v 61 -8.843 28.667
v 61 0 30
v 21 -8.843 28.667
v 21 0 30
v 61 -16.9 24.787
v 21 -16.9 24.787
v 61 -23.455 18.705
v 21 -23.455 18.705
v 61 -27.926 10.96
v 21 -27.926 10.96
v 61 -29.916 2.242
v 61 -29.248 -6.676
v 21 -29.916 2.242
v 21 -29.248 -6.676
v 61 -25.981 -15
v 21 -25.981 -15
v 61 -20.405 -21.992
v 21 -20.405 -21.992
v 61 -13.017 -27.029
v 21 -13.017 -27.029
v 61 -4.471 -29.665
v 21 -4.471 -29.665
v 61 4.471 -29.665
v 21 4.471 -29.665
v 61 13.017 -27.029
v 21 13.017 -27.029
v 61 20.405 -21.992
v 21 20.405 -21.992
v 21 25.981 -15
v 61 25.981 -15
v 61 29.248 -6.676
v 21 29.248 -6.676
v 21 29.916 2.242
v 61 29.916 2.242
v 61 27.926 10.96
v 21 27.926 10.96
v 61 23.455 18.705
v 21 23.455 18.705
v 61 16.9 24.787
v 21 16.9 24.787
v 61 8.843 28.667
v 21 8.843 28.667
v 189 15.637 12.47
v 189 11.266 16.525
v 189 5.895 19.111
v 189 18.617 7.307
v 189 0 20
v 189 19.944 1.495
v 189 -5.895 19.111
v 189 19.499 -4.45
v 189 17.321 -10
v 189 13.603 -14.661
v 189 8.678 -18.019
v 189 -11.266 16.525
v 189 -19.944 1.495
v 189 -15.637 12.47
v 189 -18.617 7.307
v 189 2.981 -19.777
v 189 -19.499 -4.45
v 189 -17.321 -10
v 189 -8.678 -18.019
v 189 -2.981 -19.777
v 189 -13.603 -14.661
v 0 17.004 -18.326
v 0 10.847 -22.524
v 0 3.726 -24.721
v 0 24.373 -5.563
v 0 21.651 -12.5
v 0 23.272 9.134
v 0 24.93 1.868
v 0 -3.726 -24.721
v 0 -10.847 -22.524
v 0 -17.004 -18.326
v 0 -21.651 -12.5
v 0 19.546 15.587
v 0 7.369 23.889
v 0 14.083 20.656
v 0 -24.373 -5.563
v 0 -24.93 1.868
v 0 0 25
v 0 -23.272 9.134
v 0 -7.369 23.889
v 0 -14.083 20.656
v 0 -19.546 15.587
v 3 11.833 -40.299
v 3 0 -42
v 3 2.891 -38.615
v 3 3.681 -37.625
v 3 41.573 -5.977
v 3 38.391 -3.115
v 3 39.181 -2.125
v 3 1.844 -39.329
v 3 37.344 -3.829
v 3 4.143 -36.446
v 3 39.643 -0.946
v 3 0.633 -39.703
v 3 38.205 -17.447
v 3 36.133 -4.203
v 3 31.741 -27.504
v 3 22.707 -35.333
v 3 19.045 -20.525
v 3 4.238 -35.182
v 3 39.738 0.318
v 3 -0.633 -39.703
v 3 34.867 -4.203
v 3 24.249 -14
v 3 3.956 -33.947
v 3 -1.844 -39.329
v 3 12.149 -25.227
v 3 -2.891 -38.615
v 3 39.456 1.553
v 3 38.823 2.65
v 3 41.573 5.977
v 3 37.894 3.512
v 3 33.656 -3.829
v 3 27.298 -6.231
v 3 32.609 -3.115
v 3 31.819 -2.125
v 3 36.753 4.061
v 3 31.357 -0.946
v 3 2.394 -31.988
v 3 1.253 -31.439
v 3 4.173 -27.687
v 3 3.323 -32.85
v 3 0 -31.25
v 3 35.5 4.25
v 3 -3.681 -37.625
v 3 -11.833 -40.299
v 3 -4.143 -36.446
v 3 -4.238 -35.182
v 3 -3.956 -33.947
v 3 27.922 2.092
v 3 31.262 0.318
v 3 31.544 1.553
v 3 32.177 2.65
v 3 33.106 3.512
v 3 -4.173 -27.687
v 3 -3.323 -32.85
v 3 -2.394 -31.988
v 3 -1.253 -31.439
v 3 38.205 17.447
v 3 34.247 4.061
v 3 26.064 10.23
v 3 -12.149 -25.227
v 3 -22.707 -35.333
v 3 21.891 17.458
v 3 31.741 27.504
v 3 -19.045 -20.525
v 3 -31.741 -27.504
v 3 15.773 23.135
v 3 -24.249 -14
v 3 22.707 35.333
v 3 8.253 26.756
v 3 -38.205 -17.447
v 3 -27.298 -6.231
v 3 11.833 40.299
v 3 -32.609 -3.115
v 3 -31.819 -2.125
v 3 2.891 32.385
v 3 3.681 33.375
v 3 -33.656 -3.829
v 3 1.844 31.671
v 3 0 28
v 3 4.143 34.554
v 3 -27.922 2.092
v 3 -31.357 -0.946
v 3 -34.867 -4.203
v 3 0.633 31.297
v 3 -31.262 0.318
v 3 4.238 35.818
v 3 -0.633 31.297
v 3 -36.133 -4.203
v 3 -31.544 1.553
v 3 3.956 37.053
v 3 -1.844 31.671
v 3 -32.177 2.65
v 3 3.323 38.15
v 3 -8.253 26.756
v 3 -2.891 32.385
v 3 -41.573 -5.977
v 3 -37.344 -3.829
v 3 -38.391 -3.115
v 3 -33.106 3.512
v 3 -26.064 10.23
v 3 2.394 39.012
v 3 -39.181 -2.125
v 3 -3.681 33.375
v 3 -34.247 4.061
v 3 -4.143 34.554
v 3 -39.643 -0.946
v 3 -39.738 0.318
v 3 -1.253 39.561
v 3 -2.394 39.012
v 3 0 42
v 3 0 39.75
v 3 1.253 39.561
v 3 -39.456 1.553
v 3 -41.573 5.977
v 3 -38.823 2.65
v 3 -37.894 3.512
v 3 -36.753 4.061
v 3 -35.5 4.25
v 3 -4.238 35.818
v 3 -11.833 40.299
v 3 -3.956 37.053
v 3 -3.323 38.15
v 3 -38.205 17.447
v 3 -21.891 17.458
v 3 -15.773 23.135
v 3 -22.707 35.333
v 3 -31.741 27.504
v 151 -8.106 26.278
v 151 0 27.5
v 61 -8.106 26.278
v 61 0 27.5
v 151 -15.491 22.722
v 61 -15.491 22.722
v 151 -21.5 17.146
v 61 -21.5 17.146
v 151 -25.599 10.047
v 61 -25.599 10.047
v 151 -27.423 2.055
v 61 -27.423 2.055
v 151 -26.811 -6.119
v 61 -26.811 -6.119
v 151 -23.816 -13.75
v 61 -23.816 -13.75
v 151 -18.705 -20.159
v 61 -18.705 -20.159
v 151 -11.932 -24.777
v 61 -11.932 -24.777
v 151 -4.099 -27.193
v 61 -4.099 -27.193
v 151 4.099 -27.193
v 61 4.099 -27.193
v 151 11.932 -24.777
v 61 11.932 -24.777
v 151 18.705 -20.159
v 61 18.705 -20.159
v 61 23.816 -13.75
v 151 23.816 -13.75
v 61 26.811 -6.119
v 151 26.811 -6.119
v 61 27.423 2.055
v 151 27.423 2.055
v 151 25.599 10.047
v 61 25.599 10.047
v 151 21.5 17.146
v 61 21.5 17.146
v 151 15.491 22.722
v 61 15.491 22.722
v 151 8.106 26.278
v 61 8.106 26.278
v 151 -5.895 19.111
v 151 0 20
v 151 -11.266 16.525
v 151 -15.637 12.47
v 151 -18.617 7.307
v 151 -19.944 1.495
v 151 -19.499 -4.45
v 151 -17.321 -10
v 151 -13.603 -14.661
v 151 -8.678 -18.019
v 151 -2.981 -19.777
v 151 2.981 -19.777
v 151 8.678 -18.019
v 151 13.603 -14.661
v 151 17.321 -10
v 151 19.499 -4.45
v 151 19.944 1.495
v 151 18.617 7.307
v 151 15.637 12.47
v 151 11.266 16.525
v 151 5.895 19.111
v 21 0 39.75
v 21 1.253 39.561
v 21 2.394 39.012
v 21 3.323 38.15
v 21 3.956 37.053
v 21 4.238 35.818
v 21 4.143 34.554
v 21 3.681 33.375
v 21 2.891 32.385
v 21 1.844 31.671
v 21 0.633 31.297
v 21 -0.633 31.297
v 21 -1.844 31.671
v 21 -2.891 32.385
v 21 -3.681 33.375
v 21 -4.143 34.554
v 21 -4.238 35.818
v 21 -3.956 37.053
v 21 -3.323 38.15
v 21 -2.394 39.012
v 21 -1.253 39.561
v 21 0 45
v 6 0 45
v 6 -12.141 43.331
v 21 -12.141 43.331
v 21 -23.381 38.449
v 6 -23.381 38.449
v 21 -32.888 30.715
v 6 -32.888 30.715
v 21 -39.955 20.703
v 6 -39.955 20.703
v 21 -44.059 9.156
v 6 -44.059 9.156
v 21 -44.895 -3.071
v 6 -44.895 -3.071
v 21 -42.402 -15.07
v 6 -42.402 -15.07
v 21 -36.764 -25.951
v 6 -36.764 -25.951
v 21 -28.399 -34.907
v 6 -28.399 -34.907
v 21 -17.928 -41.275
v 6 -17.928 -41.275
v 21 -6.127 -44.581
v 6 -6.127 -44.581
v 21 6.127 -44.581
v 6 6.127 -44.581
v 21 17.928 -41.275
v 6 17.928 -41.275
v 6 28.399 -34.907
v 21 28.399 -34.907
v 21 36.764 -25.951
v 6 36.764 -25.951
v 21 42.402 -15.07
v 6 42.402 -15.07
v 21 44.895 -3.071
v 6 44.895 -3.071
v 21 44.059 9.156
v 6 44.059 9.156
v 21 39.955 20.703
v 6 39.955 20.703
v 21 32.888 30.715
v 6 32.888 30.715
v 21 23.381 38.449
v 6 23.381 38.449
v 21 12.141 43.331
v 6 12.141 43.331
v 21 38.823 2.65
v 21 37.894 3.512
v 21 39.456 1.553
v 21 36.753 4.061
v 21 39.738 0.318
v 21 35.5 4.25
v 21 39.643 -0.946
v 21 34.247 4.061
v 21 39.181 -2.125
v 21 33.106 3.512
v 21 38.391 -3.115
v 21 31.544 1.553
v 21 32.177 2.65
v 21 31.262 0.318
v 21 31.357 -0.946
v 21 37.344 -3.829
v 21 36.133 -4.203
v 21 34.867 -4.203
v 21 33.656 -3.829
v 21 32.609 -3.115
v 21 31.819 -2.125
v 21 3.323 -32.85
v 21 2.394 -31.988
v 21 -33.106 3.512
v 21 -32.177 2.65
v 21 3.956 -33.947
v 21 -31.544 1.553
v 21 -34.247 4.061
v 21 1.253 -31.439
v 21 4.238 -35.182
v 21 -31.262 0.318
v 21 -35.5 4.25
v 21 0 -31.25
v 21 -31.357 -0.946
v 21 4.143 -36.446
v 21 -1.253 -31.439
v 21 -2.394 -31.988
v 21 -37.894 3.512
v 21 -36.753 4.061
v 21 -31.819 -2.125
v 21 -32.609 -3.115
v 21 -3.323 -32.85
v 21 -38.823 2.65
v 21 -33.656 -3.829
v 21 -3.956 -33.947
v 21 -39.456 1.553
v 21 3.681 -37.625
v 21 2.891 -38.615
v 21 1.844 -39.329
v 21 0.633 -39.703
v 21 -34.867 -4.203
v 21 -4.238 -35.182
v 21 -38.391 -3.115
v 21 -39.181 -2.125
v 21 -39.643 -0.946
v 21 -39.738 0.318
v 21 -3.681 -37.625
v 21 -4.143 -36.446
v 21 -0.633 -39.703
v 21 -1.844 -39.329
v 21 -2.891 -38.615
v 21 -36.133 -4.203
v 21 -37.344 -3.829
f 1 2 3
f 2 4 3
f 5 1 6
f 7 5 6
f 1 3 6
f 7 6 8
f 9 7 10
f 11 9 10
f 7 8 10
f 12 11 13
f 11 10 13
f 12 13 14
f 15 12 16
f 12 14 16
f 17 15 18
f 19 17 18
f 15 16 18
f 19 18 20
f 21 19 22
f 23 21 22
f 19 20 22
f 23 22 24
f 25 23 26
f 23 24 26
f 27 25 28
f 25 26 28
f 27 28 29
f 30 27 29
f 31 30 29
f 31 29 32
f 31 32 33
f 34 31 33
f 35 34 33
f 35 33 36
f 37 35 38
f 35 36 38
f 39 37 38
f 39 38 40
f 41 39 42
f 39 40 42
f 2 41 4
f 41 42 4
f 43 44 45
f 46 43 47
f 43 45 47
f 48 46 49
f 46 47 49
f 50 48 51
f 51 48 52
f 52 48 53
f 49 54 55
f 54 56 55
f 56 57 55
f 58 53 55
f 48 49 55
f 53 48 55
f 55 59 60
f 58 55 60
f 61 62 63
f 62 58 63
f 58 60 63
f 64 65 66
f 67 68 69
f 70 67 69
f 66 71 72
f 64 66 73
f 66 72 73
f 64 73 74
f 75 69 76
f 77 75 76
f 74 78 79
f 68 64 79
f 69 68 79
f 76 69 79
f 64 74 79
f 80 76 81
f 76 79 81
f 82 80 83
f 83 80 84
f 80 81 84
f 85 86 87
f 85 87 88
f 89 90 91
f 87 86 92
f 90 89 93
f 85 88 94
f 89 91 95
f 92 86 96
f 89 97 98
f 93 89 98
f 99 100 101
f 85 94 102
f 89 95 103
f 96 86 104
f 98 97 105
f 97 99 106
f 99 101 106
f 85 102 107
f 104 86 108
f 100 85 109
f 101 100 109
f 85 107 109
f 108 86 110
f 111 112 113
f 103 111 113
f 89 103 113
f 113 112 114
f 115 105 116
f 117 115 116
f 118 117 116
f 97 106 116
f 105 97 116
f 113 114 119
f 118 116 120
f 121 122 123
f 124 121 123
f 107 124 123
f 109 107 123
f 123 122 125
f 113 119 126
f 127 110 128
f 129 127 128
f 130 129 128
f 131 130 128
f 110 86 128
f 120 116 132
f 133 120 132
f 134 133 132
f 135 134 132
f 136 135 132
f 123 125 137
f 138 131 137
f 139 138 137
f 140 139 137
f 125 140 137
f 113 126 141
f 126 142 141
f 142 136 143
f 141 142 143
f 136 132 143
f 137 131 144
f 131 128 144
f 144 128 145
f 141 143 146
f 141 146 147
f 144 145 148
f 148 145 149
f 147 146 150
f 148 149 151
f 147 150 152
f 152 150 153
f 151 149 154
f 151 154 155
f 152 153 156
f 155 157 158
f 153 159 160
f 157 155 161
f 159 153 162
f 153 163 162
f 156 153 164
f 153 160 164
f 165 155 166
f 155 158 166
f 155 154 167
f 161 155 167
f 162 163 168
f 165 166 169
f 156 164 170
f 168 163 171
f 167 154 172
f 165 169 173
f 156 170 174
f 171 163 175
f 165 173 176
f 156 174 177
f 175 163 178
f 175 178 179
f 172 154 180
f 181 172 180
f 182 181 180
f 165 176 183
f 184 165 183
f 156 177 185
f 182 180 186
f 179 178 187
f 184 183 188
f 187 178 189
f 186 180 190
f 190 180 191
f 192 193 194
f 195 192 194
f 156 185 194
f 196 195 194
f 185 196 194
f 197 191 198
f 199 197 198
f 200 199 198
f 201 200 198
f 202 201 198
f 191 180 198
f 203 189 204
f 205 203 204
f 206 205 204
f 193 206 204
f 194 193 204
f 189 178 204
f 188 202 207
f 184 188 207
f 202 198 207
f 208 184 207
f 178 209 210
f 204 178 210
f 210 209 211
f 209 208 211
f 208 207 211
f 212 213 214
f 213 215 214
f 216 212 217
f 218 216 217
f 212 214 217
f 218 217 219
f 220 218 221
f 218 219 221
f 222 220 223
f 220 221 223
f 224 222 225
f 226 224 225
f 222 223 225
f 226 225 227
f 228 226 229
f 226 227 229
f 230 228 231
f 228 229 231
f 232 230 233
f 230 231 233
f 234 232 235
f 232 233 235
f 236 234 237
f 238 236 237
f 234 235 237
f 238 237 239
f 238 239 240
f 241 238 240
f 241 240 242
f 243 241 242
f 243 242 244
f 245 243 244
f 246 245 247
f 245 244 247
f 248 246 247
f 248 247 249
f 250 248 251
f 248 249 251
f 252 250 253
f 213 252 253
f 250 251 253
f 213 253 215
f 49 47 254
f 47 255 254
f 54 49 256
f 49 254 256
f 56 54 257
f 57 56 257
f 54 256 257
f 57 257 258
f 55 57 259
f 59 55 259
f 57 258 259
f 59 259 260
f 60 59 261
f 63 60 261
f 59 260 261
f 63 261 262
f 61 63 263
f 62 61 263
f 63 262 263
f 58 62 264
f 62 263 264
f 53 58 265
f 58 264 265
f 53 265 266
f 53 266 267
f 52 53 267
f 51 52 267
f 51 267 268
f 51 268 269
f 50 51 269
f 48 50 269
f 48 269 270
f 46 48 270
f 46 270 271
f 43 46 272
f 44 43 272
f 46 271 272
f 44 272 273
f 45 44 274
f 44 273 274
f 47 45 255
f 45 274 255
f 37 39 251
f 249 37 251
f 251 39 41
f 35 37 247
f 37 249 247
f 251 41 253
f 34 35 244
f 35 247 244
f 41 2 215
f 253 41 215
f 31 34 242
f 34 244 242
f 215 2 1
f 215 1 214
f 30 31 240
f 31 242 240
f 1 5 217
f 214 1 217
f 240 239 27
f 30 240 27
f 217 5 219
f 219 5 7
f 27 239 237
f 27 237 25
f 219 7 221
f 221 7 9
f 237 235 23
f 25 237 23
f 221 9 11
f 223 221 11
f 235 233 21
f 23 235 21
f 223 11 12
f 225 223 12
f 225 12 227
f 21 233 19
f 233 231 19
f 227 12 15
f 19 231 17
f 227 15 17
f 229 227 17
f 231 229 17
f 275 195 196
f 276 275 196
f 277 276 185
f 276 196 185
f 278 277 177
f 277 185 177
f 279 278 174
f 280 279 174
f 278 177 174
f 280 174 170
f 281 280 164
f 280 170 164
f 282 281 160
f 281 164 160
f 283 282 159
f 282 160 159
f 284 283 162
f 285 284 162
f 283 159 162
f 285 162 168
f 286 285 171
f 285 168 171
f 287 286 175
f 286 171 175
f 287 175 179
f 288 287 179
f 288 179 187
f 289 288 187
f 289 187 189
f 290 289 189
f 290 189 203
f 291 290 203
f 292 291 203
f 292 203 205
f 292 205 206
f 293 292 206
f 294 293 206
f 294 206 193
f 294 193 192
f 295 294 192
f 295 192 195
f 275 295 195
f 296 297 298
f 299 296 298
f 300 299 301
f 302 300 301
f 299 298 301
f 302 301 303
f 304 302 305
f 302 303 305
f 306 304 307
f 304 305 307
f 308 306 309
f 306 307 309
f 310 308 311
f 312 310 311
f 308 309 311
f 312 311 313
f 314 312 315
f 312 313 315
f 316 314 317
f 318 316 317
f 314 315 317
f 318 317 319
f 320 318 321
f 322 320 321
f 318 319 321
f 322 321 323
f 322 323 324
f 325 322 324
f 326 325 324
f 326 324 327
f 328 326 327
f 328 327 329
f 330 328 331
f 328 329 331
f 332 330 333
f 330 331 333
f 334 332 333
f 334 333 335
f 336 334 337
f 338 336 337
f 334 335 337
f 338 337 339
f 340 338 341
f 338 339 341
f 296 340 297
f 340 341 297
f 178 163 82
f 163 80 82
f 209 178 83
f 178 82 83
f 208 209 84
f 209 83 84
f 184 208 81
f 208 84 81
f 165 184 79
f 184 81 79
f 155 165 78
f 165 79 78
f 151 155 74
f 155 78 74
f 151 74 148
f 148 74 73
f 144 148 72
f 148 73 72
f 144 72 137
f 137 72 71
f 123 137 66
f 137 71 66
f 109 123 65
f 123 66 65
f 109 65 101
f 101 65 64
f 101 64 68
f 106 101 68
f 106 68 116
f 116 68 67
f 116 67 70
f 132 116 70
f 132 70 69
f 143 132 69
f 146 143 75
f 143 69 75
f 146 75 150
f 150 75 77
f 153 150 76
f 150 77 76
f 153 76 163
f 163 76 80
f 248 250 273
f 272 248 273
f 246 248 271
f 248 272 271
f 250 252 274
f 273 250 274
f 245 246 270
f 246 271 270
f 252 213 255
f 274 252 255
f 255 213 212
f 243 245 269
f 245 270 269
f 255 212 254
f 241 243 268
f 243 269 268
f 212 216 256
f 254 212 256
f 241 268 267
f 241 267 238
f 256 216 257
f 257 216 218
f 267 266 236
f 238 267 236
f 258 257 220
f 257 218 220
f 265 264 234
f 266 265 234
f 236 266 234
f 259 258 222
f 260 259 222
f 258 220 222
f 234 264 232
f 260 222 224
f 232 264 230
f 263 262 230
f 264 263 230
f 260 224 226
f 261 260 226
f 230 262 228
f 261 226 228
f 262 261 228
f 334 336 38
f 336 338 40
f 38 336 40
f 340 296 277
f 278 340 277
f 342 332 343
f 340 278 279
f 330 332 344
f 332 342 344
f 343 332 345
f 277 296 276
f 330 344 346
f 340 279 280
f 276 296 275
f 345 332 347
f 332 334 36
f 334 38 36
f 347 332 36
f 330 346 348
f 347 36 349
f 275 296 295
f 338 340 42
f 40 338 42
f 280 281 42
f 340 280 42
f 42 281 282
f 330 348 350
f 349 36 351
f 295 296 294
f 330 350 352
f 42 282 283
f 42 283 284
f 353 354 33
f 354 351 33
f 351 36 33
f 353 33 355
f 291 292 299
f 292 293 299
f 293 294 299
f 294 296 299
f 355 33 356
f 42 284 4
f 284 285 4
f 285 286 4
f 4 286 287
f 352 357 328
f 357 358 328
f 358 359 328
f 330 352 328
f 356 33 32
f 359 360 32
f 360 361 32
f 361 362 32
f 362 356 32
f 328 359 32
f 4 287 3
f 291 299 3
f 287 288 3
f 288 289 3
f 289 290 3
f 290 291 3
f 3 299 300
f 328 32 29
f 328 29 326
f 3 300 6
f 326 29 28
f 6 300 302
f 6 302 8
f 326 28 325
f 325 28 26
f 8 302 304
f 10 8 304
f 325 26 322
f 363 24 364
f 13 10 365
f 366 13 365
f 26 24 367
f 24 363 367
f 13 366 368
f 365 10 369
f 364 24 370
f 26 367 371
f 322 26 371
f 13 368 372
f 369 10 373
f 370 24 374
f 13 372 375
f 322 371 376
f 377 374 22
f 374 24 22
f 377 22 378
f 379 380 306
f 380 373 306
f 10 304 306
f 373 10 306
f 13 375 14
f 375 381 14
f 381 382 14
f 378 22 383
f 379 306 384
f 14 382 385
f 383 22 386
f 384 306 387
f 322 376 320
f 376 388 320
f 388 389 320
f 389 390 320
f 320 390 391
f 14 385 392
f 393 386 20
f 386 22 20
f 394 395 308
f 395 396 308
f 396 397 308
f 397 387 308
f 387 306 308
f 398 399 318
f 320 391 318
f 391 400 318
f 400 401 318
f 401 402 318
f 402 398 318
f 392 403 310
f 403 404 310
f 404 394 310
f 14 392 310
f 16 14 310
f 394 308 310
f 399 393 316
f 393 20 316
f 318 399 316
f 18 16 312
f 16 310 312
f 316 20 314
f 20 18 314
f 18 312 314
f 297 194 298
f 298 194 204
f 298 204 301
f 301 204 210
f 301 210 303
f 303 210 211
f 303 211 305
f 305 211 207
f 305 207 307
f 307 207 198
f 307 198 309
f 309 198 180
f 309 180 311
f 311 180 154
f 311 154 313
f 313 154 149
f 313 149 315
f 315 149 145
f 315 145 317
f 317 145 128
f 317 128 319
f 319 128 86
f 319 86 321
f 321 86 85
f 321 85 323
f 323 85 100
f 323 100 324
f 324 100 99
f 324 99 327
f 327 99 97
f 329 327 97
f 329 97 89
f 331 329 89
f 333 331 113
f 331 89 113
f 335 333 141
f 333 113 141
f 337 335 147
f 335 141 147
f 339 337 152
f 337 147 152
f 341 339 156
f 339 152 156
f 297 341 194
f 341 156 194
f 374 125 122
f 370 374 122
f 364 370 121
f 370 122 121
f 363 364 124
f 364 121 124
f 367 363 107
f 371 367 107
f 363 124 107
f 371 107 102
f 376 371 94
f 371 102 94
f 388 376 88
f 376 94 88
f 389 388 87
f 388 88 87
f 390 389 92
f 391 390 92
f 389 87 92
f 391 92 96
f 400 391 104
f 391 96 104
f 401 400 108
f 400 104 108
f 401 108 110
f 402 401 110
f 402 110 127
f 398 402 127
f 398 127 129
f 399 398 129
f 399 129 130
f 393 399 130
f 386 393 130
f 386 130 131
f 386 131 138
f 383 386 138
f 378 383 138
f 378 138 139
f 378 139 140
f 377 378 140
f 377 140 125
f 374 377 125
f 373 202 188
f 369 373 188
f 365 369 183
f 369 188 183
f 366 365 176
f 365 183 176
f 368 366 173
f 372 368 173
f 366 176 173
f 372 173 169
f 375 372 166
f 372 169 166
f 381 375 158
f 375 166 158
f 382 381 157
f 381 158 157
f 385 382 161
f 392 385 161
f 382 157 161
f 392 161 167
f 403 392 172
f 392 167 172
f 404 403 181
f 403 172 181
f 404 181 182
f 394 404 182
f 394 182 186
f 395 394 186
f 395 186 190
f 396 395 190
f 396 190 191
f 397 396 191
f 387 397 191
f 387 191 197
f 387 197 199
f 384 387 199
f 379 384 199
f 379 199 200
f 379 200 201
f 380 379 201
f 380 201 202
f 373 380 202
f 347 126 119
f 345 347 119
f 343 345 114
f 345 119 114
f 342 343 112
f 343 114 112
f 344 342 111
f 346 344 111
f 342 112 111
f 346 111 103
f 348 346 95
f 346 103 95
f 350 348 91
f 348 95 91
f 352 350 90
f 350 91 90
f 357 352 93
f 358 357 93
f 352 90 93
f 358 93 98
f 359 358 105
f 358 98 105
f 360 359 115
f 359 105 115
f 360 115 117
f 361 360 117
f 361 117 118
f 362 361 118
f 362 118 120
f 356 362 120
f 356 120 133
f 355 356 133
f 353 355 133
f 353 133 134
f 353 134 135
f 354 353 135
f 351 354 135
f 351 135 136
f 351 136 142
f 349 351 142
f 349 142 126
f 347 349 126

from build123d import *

# Parameters (mm, degrees)
CHAMFER1_SIZE      = 3
CUT_EXTRUDE1_REACH = 198.586
SKETCH2_R          = 4.25


with BuildPart() as part:
    # Sketch1 → Revolve1 (revolve)
    with BuildSketch(Plane.XY, mode=Mode.PRIVATE) as revolve1_sk:
        Polygon((189, 0), (189, 20), (151, 20), (151, 27.5), (61, 27.5), (61, 30), (21, 30), (21, 45), (3, 45), (3, 28), (0, 25), (0, 0), align=None)
    revolve(revolve1_sk.sketch.rotate(Axis((0, 0, 0), (1, 0, 0)), 90), axis=Axis((0, 0, 0), (1, 0, 0)))

    # Chamfer1
    chamfer1_edges = [part.edges().sort_by_distance(p)[0] for p in [
        (3, 0, -45),
    ]]
    chamfer(chamfer1_edges, length=CHAMFER1_SIZE)

    # Sketch2 → Cut-Extrude1 (cut, up to next)
    with BuildSketch(Plane.ZY.offset(-3), mode=Mode.PRIVATE) as cut_extrude1_sk1:
        with Locations((35.5, 0)):
            Circle(SKETCH2_R)
    cut_extrude1_tool1 = extrude(cut_extrude1_sk1.sketch, amount=-CUT_EXTRUDE1_REACH, mode=Mode.PRIVATE) & part.part
    # Sketch2 → Cut-Extrude1 (cut, up to next)
    with BuildSketch(Plane.ZY.offset(-3), mode=Mode.PRIVATE) as cut_extrude1_sk2:
        with Locations((0, -35.5)):
            Circle(SKETCH2_R)
    cut_extrude1_tool2 = extrude(cut_extrude1_sk2.sketch, amount=-CUT_EXTRUDE1_REACH, mode=Mode.PRIVATE) & part.part
    # Sketch2 → Cut-Extrude1 (cut, up to next)
    with BuildSketch(Plane.ZY.offset(-3), mode=Mode.PRIVATE) as cut_extrude1_sk3:
        with Locations((-35.5, 0)):
            Circle(SKETCH2_R)
    cut_extrude1_tool3 = extrude(cut_extrude1_sk3.sketch, amount=-CUT_EXTRUDE1_REACH, mode=Mode.PRIVATE) & part.part
    # Sketch2 → Cut-Extrude1 (cut, up to next)
    with BuildSketch(Plane.ZY.offset(-3), mode=Mode.PRIVATE) as cut_extrude1_sk4:
        with Locations((0, 35.5)):
            Circle(SKETCH2_R)
    cut_extrude1_tool4 = extrude(cut_extrude1_sk4.sketch, amount=-CUT_EXTRUDE1_REACH, mode=Mode.PRIVATE) & part.part
    add(cut_extrude1_tool1.solids().sort_by_distance((3, 0, 35.5))[0], mode=Mode.SUBTRACT)
    add(cut_extrude1_tool2.solids().sort_by_distance((3, -35.5, 0))[0], mode=Mode.SUBTRACT)
    add(cut_extrude1_tool3.solids().sort_by_distance((3, 0, -35.5))[0], mode=Mode.SUBTRACT)
    add(cut_extrude1_tool4.solids().sort_by_distance((3, 35.5, 0))[0], mode=Mode.SUBTRACT)


solid = part.part
